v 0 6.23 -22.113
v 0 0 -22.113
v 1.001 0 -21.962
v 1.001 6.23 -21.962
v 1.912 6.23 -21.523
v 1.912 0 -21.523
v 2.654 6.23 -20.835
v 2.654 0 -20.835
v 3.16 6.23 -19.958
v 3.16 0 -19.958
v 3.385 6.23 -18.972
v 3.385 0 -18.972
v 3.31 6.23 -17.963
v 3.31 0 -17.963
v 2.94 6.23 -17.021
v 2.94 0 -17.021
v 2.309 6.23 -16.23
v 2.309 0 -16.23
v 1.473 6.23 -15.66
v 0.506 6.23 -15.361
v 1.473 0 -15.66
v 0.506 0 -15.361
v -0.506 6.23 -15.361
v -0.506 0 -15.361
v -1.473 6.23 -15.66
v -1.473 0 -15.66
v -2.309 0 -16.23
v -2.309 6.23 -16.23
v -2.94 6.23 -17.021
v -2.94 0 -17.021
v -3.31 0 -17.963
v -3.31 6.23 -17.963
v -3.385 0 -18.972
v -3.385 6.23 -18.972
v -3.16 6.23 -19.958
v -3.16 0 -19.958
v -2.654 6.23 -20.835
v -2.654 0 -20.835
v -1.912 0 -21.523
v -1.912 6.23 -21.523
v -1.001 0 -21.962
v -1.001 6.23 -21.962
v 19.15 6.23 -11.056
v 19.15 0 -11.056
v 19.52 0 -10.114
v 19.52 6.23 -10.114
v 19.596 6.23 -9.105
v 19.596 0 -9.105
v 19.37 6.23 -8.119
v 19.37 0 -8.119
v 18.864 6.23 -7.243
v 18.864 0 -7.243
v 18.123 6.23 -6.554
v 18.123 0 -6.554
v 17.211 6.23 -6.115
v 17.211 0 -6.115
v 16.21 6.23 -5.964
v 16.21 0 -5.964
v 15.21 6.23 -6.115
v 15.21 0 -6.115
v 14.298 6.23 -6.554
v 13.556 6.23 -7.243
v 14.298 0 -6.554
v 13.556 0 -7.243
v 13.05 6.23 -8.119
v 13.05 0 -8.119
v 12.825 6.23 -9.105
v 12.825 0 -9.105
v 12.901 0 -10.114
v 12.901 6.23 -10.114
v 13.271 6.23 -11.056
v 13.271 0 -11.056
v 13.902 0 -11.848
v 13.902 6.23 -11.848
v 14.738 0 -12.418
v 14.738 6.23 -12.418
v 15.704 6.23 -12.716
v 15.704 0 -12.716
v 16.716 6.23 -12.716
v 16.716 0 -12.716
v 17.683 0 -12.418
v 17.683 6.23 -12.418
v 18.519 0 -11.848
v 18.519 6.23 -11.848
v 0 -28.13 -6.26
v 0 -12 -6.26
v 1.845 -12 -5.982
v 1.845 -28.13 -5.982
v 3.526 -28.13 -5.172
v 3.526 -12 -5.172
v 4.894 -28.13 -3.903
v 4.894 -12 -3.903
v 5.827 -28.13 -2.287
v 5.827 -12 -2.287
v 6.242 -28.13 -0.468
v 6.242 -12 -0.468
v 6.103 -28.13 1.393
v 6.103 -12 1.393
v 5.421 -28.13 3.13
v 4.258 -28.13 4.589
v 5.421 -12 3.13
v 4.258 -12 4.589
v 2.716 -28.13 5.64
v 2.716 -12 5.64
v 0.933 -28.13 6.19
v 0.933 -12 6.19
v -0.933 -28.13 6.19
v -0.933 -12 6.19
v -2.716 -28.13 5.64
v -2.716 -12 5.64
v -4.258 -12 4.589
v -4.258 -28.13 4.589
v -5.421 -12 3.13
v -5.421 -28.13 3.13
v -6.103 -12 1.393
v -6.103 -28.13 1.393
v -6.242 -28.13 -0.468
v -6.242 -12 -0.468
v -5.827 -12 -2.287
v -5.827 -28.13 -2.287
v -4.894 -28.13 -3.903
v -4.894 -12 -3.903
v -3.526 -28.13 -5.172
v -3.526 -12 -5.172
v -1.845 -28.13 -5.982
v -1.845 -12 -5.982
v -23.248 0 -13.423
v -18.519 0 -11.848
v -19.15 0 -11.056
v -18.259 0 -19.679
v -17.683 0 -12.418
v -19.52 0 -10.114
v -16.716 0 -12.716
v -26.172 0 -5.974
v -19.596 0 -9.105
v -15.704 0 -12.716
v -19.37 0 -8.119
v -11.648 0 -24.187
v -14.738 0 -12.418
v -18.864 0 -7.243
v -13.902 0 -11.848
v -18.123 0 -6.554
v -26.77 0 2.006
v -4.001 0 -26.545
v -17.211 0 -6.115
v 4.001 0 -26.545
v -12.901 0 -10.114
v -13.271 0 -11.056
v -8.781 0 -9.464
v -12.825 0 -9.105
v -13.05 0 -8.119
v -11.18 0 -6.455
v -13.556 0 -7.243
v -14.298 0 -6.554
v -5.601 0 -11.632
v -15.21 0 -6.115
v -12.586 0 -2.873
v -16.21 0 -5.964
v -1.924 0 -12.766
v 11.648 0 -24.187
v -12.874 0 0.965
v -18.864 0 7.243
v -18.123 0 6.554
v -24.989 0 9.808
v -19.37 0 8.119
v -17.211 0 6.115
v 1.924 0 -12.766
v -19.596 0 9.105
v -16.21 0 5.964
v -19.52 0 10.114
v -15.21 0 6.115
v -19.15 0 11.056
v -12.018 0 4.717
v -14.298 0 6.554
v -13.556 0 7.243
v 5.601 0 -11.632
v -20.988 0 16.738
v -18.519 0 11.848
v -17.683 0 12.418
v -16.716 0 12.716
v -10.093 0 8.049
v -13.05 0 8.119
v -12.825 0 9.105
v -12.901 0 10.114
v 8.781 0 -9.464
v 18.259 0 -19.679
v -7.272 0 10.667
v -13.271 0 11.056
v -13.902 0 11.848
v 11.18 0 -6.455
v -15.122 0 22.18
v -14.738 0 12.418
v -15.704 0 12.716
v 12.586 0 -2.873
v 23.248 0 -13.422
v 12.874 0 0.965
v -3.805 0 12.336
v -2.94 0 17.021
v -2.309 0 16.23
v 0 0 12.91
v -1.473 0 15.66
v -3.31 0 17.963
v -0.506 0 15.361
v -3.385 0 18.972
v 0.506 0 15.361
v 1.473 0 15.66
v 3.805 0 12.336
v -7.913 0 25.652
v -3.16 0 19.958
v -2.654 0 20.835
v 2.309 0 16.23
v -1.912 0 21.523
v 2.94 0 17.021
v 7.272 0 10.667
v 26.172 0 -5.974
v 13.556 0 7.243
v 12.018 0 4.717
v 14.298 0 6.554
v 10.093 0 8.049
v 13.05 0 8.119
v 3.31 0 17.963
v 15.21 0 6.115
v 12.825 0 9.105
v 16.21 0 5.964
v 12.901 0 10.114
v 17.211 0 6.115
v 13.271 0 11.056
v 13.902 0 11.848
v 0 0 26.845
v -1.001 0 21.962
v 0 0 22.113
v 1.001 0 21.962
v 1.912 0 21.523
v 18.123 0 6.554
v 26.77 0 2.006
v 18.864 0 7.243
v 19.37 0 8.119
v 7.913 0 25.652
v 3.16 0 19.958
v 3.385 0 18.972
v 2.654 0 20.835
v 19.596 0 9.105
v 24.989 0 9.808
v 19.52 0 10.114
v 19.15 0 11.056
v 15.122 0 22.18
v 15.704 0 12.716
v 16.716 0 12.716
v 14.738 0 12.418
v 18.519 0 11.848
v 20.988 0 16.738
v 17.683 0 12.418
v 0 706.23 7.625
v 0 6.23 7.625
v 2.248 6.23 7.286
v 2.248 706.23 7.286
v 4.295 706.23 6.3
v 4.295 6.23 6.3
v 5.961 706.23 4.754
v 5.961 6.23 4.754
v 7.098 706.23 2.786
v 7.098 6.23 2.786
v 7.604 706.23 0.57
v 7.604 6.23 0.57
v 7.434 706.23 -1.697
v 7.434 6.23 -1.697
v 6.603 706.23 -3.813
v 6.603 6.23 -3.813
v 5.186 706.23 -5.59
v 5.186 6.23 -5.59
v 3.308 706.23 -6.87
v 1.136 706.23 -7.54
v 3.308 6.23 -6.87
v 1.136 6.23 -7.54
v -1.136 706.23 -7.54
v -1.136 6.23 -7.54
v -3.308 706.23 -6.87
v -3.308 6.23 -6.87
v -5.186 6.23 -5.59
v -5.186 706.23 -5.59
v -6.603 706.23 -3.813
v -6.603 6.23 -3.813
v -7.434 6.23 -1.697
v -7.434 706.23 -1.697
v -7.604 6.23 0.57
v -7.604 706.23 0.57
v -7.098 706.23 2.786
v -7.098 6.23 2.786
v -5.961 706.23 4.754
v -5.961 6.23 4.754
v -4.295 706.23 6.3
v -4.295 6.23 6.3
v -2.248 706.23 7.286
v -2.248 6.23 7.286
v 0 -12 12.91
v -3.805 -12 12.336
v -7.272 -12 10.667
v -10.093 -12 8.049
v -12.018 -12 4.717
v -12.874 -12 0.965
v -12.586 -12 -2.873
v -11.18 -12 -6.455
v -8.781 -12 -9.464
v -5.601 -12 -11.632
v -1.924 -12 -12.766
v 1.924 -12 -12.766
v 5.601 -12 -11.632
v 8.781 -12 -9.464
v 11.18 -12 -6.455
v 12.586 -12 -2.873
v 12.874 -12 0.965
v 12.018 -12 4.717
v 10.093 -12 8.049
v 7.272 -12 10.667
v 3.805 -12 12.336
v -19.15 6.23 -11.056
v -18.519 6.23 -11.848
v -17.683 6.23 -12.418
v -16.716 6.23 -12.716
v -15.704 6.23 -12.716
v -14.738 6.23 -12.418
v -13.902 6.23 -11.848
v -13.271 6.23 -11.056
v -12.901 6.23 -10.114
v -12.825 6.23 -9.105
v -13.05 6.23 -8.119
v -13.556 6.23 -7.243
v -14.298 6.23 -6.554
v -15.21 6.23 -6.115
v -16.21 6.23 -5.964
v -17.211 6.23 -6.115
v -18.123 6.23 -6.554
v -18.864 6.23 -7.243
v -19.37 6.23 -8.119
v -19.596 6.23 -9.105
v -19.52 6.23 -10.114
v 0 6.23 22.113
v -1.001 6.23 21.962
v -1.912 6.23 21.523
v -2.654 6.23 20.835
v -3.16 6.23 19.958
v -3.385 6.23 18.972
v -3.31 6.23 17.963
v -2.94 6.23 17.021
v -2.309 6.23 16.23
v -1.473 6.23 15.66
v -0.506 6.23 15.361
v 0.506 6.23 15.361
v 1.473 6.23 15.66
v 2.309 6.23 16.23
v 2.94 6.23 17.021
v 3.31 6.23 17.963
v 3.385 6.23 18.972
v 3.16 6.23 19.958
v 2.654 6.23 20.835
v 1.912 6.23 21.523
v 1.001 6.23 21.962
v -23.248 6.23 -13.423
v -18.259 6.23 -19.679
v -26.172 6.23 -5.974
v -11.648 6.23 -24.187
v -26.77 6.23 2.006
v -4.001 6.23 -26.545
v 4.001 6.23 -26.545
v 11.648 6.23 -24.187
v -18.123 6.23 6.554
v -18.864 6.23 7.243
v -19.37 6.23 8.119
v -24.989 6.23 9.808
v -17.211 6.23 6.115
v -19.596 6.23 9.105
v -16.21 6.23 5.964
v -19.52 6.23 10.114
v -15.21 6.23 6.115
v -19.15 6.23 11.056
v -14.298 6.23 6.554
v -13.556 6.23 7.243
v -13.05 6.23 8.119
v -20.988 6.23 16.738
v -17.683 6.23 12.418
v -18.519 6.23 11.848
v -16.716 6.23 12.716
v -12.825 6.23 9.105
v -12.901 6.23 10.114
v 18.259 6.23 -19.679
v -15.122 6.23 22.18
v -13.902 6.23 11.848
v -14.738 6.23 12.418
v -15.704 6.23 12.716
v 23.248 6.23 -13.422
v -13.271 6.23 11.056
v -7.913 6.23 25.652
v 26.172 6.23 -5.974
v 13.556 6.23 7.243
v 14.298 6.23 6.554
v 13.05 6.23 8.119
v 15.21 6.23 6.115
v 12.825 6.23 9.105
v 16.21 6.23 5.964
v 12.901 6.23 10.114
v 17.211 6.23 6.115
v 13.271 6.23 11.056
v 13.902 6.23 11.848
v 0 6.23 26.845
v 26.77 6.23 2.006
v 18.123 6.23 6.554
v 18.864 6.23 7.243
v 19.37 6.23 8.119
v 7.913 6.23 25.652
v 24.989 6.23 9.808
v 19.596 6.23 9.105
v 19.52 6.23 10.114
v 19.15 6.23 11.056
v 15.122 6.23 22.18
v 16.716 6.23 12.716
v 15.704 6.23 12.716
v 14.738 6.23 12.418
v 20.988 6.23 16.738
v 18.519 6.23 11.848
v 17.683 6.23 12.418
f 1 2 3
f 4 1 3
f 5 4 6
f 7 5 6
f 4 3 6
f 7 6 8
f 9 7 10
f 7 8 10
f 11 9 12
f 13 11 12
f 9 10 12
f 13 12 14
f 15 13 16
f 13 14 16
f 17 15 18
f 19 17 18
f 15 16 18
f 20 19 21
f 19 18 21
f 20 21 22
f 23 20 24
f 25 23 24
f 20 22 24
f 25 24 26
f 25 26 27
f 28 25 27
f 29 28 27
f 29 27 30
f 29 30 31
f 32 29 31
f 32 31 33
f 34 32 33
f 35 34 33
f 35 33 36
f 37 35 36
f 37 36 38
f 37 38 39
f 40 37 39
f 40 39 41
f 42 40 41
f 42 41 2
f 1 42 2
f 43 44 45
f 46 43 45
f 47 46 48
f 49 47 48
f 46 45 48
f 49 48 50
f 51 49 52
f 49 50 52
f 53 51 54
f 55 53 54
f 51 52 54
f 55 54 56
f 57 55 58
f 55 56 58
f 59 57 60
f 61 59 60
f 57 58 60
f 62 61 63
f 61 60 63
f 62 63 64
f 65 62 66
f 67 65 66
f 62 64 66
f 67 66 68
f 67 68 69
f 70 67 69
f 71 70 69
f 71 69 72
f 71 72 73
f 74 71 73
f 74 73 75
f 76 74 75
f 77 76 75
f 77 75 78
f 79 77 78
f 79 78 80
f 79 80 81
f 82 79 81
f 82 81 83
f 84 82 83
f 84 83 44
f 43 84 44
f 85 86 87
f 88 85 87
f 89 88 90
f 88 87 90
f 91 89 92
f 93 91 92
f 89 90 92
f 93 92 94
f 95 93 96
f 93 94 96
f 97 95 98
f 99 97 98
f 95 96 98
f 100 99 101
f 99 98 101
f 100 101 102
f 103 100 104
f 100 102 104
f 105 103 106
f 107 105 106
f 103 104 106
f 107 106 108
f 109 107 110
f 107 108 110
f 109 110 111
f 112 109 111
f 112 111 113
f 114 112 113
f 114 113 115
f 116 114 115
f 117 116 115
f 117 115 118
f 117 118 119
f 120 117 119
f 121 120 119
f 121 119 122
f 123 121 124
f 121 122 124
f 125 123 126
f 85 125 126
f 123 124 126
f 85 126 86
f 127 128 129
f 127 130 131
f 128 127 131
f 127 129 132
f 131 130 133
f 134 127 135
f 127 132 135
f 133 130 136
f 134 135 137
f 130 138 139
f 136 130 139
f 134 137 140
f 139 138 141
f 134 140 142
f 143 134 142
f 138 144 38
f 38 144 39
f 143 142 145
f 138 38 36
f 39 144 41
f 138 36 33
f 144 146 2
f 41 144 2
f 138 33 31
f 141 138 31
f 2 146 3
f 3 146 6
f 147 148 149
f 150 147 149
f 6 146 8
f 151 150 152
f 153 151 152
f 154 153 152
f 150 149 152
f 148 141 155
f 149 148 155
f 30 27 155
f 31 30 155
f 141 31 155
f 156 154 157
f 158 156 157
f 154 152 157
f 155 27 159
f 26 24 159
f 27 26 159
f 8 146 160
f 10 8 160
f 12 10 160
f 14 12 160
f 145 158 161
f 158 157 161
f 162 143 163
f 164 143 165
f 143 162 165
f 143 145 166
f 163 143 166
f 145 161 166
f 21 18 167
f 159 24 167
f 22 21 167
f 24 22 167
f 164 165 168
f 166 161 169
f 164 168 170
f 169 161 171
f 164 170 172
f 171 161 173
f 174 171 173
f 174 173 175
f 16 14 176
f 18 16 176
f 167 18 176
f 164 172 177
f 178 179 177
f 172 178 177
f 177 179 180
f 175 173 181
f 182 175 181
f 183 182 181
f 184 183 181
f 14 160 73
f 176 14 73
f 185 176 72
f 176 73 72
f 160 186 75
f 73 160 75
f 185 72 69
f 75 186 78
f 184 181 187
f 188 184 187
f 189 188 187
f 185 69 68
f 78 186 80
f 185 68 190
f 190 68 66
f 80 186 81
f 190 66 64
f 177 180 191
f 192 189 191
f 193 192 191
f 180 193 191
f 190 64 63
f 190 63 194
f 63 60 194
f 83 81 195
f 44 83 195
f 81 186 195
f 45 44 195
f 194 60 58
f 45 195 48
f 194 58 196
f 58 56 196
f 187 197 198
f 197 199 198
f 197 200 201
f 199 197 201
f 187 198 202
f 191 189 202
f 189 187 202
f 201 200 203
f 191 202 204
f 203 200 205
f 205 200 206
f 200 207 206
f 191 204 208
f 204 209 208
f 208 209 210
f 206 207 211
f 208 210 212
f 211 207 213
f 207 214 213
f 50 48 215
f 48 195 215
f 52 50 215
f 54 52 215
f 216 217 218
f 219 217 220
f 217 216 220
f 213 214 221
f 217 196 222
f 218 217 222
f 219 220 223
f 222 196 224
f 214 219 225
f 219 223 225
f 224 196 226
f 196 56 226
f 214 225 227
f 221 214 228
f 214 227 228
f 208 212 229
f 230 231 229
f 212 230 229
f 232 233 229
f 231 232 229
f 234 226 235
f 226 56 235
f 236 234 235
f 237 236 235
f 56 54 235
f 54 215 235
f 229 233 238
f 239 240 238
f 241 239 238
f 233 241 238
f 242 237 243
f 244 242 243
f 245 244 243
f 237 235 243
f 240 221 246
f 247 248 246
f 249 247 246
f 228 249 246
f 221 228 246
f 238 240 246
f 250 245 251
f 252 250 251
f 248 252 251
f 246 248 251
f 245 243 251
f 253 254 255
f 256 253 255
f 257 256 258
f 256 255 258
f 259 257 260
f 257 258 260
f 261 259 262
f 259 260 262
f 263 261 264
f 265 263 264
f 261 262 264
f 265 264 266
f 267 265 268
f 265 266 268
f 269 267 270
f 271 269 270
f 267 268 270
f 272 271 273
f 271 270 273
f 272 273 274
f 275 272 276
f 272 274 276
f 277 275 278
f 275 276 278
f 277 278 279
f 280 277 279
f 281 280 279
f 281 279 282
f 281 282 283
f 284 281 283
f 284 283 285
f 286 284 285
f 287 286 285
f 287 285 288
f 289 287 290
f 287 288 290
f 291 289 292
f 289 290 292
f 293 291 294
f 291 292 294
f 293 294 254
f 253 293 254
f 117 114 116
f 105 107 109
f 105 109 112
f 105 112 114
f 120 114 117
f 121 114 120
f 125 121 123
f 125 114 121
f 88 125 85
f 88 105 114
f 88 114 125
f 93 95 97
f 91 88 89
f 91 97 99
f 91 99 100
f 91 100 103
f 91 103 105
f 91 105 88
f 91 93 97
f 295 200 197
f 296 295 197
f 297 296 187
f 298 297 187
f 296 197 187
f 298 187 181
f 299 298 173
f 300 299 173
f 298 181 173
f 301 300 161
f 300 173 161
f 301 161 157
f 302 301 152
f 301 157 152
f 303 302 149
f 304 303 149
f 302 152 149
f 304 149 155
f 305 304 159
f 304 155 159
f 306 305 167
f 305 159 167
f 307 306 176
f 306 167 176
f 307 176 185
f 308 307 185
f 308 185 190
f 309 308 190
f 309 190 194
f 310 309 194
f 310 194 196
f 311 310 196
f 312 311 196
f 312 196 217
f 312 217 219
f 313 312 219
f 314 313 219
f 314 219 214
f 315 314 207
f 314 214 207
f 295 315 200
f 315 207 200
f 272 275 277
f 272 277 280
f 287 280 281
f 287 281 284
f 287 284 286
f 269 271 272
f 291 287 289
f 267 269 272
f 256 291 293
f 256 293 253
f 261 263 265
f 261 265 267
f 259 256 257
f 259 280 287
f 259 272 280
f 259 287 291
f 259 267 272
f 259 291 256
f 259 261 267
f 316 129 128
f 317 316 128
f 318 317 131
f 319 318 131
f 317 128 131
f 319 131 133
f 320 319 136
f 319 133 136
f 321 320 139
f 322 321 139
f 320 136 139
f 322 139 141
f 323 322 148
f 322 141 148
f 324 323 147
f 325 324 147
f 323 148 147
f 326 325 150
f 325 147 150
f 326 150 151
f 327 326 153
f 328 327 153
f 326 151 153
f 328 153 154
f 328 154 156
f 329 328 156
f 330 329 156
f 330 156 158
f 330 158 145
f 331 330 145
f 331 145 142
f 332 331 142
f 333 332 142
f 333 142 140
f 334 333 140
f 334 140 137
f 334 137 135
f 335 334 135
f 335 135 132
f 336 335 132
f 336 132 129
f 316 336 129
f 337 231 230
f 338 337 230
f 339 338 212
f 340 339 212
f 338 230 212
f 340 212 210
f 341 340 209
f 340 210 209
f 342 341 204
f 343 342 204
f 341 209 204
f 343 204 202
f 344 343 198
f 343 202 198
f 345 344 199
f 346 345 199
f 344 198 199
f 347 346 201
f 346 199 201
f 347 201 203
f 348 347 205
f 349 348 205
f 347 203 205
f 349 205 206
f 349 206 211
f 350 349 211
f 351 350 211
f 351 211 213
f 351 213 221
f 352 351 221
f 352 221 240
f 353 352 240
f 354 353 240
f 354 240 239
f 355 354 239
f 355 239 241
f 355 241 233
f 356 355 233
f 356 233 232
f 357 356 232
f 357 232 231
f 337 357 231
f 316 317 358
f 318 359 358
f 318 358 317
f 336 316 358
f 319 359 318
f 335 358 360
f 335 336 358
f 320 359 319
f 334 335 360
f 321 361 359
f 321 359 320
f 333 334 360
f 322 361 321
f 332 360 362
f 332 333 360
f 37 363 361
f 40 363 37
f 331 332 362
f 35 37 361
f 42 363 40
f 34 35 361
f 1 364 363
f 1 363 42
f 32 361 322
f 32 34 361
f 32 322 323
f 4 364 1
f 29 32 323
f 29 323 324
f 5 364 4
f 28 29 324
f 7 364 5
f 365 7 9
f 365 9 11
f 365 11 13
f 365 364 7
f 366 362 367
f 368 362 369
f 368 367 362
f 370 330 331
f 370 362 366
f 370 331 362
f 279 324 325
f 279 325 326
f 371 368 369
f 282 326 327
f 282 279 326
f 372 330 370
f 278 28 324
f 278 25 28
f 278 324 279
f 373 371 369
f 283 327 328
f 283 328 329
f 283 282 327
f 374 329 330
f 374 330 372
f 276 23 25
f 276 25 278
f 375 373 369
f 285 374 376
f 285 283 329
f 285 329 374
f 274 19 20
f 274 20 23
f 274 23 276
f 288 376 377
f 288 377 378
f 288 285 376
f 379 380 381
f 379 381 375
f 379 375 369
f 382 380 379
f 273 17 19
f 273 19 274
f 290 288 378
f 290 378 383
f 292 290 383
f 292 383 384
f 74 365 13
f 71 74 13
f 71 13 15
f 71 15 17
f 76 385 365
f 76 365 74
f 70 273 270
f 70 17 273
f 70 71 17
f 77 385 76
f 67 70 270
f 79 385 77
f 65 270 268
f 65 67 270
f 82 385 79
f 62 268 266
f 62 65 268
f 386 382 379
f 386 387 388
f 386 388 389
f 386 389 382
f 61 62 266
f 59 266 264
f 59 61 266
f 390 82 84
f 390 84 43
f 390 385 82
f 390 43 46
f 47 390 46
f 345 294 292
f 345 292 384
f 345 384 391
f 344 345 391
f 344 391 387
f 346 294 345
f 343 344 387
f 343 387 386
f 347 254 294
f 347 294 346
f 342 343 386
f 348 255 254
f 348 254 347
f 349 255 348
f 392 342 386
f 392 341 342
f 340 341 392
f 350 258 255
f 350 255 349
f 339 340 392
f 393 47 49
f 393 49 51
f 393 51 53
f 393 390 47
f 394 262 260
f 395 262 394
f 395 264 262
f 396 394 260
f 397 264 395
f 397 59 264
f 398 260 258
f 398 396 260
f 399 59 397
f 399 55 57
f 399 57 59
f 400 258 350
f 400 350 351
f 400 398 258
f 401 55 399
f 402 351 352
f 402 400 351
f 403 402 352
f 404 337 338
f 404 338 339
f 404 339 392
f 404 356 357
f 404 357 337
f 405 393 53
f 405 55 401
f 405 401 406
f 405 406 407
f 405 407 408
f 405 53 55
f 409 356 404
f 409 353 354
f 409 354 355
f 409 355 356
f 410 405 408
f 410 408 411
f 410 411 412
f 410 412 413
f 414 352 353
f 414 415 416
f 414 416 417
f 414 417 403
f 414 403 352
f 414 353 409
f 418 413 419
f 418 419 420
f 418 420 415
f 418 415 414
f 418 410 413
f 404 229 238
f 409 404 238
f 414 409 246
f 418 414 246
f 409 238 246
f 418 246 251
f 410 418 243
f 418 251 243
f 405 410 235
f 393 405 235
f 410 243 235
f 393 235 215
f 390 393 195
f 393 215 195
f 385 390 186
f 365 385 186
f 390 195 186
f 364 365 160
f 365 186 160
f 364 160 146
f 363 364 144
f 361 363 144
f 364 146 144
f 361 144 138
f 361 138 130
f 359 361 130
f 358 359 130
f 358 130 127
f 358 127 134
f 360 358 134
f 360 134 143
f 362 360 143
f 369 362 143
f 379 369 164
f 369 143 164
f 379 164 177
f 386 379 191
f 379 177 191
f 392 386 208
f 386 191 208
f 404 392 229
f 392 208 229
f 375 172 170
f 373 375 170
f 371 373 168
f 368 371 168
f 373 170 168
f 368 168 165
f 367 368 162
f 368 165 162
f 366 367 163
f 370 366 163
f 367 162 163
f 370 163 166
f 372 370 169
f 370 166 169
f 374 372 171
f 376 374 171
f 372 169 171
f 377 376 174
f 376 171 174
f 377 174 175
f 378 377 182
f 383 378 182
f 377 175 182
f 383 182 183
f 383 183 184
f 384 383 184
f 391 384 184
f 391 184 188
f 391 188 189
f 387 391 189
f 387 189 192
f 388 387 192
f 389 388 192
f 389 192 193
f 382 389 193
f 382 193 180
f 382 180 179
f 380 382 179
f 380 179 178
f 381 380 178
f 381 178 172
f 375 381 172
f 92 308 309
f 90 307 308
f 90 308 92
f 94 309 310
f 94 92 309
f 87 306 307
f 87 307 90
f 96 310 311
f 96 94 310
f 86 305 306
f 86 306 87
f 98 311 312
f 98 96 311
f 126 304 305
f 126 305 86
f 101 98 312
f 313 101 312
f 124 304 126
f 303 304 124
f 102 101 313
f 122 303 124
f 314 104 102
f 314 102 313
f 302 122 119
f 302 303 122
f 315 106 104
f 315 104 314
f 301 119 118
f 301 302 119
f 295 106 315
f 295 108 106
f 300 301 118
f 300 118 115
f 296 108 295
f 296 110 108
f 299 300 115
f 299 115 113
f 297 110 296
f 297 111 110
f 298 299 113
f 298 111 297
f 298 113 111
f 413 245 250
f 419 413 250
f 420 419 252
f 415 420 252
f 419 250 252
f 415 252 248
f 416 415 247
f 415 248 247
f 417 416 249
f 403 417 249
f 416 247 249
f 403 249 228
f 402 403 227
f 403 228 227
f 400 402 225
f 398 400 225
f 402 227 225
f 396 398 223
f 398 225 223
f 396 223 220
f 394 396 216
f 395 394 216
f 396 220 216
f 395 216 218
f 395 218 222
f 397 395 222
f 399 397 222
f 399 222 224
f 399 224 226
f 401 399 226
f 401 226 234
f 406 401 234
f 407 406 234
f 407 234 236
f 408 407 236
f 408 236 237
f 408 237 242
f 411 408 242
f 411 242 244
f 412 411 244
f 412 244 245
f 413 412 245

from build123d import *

# Parameters (mm, degrees)
SKETCH1_R           = 26.845
BOSS_EXTRUDE1_DEPTH = 6.23
SKETCH2_R           = 7.625
BOSS_EXTRUDE2_DEPTH = 700
SKETCH3_R           = 12.91
BOSS_EXTRUDE3_DEPTH = 12
SKETCH4_R           = 3.394618091
CUT_EXTRUDE1_DEPTH  = 12
CIRPATTERN1_COUNT   = 6
SKETCH6_R           = 6.26
BOSS_EXTRUDE4_DEPTH = 16.13


with BuildPart() as part:
    # Sketch1 → Boss-Extrude1 (new body)
    with BuildSketch(Plane(origin=(0, 0, 0), x_dir=(1, 0, 0), z_dir=(0, 1, 0))):
        Circle(SKETCH1_R)
    extrude(amount=BOSS_EXTRUDE1_DEPTH)

    # Sketch2 → Boss-Extrude2 (add)
    with BuildSketch(Plane(origin=(0, 6.23, 0), x_dir=(1, 0, 0), z_dir=(0, 1, 0))):
        Circle(SKETCH2_R)
    extrude(amount=BOSS_EXTRUDE2_DEPTH)

    # Sketch3 → Boss-Extrude3 (add)
    with BuildSketch(Plane.XZ):
        Circle(SKETCH3_R)
    extrude(amount=BOSS_EXTRUDE3_DEPTH)

    # Sketch4 → Cut-Extrude1 (cut)
    with BuildSketch(Plane(origin=(0, 0, 0), x_dir=(-1, 0, 0), z_dir=(0, -1, 0))):
        with Locations((0, 18.718198498)):
            Circle(SKETCH4_R)
    cut_extrude1 = extrude(amount=-CUT_EXTRUDE1_DEPTH, mode=Mode.SUBTRACT)

    # CirPattern1: Cut-Extrude1 ×6 about axis
    cirpattern1_axis = Axis((0, -12, 0), (0, 1, 0))
    for i in range(1, CIRPATTERN1_COUNT):
        add(cut_extrude1.rotate(cirpattern1_axis, i * 360 / CIRPATTERN1_COUNT), mode=Mode.SUBTRACT)

    # Sketch6 → Boss-Extrude4 (add)
    with BuildSketch(Plane(origin=(0, -12, 0), x_dir=(-1, 0, 0), z_dir=(0, -1, 0))):
        Circle(SKETCH6_R)
    extrude(amount=BOSS_EXTRUDE4_DEPTH)


solid = part.part
